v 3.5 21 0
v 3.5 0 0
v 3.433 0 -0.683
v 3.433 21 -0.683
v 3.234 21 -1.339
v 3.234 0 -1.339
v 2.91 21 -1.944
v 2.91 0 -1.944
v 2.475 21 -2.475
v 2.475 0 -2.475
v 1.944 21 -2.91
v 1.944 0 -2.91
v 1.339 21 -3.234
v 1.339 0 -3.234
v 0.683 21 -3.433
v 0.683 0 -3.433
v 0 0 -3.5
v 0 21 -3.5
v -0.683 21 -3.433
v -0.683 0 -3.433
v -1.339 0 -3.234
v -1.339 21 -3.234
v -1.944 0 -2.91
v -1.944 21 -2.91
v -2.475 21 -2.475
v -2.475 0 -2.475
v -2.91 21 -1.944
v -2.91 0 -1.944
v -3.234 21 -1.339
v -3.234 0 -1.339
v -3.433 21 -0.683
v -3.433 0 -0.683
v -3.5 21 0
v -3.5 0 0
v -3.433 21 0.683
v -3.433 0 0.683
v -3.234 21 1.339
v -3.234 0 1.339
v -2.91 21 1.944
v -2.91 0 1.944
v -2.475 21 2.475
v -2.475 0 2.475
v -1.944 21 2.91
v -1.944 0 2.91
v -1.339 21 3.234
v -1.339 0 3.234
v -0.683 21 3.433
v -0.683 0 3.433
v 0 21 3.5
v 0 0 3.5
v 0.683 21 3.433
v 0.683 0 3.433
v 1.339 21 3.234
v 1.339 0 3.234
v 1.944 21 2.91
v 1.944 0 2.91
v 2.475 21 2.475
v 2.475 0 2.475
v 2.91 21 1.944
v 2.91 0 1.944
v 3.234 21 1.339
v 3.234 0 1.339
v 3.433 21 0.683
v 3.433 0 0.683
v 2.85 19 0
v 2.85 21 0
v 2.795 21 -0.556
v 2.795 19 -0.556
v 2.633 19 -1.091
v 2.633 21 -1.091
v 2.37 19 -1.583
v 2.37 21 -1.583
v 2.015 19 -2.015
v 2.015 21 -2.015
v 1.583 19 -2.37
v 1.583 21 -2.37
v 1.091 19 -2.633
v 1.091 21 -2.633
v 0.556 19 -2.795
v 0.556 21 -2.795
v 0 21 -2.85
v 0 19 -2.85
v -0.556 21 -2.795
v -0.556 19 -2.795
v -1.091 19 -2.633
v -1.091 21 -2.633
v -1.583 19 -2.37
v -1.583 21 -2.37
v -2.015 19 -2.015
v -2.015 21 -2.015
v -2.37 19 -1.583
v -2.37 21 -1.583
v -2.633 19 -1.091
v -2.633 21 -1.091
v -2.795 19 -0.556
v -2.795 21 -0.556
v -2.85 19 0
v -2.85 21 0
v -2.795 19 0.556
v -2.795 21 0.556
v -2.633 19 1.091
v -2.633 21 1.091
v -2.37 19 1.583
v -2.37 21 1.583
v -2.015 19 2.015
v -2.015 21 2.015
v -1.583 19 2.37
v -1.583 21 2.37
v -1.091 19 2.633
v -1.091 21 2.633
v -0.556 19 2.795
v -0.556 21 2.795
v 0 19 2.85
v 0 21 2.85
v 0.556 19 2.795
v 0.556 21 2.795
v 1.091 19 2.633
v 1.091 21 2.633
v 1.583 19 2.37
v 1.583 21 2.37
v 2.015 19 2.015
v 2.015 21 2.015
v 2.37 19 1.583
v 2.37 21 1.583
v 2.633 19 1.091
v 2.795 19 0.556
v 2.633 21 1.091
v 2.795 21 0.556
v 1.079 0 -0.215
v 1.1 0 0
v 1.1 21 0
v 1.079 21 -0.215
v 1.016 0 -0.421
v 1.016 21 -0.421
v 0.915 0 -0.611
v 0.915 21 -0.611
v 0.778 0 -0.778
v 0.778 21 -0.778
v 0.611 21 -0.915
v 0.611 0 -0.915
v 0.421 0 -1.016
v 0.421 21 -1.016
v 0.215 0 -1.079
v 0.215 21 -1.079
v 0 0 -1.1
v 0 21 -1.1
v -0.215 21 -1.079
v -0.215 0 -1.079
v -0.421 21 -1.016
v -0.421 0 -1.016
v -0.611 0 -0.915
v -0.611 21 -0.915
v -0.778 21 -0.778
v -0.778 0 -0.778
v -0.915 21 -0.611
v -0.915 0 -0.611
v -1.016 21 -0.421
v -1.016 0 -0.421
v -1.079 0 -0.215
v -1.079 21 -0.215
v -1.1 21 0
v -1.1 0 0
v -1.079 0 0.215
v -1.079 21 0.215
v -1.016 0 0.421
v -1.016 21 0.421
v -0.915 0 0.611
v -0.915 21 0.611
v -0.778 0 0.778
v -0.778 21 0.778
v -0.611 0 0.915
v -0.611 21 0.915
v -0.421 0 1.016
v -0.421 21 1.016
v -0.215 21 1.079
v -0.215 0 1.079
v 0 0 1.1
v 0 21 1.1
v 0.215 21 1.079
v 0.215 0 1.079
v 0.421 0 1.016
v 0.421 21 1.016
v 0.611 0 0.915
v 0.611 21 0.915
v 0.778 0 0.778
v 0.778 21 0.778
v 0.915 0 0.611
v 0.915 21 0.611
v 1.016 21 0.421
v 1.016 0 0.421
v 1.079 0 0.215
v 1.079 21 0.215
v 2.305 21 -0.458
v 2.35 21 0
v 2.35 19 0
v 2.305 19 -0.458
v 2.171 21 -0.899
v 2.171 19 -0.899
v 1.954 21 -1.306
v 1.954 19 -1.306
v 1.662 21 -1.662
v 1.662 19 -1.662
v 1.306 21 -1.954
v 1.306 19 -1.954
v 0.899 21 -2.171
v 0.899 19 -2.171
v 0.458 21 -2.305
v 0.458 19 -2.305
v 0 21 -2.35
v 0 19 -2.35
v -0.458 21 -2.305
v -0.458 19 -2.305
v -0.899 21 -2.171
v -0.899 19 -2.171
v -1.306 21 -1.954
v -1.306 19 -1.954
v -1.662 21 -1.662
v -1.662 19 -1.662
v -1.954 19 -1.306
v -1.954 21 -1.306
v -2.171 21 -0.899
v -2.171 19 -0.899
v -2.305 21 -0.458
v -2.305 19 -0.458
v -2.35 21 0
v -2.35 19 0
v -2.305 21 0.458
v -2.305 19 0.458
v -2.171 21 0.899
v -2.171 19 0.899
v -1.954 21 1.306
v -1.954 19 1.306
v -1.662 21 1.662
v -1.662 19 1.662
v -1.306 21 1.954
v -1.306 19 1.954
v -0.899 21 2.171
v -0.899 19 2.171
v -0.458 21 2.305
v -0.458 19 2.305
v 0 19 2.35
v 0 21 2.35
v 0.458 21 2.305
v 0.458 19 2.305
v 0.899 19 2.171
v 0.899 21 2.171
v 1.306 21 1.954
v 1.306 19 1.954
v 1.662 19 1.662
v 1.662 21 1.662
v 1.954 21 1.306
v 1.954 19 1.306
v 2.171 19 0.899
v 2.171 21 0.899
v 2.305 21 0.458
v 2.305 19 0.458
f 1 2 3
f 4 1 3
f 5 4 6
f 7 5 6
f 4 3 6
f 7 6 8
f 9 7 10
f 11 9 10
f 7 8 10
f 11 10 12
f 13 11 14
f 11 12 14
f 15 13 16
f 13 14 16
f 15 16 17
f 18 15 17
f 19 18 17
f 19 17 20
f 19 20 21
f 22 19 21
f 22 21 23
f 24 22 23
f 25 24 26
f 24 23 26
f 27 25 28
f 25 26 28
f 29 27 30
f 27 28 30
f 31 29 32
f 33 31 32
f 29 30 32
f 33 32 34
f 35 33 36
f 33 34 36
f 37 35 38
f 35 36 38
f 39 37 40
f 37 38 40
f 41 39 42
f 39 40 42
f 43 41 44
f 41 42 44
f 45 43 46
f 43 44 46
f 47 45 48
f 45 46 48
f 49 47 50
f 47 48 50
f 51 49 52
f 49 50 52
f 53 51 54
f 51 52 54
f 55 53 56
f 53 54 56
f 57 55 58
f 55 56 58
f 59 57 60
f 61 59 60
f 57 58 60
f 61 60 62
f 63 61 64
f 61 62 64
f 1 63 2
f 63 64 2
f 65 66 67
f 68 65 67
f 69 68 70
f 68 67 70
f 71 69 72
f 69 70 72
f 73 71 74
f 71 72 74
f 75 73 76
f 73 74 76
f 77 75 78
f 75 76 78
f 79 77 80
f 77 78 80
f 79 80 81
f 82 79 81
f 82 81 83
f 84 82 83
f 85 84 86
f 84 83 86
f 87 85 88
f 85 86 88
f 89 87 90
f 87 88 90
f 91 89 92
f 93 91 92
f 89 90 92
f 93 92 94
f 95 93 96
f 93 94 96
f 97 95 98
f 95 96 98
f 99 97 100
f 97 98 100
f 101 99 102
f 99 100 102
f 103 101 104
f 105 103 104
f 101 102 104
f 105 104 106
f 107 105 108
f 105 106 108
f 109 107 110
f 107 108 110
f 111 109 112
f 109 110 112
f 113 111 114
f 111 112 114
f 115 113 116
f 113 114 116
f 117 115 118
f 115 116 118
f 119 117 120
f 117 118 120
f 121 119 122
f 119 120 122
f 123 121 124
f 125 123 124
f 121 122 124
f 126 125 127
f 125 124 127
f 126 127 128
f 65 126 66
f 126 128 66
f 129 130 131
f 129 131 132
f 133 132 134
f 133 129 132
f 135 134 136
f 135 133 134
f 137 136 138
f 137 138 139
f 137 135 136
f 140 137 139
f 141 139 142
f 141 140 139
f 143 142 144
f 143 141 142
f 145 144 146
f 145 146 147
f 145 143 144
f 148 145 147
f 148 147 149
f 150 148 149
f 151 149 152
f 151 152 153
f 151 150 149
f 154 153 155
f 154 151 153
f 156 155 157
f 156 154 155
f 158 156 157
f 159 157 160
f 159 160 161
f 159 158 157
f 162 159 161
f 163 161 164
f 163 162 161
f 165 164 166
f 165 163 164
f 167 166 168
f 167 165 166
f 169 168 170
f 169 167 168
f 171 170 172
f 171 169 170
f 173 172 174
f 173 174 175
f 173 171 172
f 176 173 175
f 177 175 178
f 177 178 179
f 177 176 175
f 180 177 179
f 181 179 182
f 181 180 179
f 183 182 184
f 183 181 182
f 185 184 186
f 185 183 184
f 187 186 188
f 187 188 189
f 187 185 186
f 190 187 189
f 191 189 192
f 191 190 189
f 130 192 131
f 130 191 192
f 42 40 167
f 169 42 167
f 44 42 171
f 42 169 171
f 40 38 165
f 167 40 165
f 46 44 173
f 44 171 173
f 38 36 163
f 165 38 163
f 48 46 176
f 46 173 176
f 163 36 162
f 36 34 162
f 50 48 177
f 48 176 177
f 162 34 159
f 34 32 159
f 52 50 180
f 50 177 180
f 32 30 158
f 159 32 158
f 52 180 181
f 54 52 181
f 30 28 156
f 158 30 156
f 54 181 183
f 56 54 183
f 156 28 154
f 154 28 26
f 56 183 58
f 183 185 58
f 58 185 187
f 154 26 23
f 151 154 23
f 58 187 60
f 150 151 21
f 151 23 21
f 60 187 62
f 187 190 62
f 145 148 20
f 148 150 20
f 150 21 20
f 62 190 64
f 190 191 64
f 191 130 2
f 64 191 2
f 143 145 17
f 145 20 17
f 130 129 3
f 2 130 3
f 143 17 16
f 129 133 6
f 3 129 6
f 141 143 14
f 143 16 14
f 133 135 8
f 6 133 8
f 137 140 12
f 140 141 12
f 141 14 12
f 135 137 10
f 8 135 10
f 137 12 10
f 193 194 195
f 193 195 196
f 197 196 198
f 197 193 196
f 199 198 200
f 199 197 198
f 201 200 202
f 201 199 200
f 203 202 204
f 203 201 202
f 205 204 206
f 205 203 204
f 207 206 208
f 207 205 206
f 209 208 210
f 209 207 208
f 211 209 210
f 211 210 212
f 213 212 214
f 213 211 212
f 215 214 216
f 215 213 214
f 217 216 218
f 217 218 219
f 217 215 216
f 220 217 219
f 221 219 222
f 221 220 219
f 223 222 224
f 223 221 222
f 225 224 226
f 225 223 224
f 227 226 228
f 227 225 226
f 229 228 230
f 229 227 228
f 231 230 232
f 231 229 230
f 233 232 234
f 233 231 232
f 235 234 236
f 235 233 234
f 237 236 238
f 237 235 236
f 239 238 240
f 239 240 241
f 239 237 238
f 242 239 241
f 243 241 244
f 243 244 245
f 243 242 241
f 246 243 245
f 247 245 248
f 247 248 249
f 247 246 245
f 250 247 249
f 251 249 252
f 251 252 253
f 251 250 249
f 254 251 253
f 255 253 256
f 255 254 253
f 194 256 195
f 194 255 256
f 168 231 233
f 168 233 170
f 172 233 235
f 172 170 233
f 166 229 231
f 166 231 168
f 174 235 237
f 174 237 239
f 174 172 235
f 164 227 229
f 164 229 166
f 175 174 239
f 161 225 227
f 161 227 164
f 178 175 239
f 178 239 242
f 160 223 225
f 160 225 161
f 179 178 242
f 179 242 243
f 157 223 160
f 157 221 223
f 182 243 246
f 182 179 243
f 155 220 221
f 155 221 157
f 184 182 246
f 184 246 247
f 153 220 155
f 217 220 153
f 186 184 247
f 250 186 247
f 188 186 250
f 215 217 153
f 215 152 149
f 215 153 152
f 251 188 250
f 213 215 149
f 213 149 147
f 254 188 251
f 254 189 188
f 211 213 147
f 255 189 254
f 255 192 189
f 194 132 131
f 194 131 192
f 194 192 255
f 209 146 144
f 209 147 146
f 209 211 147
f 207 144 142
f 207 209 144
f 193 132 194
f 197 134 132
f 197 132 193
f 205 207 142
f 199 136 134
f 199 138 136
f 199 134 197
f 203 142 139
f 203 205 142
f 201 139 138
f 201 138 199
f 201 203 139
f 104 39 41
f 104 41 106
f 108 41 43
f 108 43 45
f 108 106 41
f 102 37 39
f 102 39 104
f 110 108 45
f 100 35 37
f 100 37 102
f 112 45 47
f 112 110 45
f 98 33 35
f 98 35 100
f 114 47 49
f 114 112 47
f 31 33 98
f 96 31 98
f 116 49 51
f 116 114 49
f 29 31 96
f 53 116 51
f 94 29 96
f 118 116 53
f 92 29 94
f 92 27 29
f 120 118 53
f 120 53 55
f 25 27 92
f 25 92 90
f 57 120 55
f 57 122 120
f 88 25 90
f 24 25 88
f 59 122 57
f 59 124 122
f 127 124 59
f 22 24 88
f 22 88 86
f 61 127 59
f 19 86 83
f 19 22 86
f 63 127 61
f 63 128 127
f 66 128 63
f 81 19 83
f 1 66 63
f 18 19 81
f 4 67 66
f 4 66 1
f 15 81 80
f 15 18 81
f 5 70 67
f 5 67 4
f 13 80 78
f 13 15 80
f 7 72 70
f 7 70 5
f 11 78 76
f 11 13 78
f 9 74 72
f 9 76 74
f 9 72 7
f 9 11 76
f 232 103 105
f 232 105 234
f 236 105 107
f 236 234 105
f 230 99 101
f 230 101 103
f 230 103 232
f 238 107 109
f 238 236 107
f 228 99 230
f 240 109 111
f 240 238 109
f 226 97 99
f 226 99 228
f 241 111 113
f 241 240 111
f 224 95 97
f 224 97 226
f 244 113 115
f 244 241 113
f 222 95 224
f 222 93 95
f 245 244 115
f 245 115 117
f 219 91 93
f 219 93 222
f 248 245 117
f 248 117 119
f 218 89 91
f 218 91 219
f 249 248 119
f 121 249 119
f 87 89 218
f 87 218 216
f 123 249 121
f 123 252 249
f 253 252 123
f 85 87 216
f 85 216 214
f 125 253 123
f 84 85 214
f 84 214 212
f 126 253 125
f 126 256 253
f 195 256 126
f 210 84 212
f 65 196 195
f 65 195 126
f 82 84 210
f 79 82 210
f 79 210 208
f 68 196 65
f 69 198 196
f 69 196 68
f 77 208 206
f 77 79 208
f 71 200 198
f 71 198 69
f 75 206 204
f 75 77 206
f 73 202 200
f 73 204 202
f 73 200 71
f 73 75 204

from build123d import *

# Parameters (mm, degrees)
ESQUISSE1_R             = 3.5
ESQUISSE1_R_2           = 1.1
BOSS_EXTRU_2_DEPTH      = 21
ESQUISSE2_R             = 2.85
ESQUISSE2_R_2           = 2.35
ENL_V_MAT_EXTRU_1_DEPTH = 2


with BuildPart() as part:
    # Esquisse1 → Boss.-Extru.2 (new body)
    with BuildSketch(Plane(origin=(0, 0, 0), x_dir=(1, 0, 0), z_dir=(0, 1, 0))):
        Circle(ESQUISSE1_R)
        Circle(ESQUISSE1_R_2, mode=Mode.SUBTRACT)
    extrude(amount=BOSS_EXTRU_2_DEPTH)

    # Esquisse2 → Enlèv. mat.-Extru.1 (cut)
    with BuildSketch(Plane(origin=(0, 21, 0), x_dir=(1, 0, 0), z_dir=(0, 1, 0))):
        Circle(ESQUISSE2_R)
        Circle(ESQUISSE2_R_2, mode=Mode.SUBTRACT)
    extrude(amount=-ENL_V_MAT_EXTRU_1_DEPTH, mode=Mode.SUBTRACT)


solid = part.part
